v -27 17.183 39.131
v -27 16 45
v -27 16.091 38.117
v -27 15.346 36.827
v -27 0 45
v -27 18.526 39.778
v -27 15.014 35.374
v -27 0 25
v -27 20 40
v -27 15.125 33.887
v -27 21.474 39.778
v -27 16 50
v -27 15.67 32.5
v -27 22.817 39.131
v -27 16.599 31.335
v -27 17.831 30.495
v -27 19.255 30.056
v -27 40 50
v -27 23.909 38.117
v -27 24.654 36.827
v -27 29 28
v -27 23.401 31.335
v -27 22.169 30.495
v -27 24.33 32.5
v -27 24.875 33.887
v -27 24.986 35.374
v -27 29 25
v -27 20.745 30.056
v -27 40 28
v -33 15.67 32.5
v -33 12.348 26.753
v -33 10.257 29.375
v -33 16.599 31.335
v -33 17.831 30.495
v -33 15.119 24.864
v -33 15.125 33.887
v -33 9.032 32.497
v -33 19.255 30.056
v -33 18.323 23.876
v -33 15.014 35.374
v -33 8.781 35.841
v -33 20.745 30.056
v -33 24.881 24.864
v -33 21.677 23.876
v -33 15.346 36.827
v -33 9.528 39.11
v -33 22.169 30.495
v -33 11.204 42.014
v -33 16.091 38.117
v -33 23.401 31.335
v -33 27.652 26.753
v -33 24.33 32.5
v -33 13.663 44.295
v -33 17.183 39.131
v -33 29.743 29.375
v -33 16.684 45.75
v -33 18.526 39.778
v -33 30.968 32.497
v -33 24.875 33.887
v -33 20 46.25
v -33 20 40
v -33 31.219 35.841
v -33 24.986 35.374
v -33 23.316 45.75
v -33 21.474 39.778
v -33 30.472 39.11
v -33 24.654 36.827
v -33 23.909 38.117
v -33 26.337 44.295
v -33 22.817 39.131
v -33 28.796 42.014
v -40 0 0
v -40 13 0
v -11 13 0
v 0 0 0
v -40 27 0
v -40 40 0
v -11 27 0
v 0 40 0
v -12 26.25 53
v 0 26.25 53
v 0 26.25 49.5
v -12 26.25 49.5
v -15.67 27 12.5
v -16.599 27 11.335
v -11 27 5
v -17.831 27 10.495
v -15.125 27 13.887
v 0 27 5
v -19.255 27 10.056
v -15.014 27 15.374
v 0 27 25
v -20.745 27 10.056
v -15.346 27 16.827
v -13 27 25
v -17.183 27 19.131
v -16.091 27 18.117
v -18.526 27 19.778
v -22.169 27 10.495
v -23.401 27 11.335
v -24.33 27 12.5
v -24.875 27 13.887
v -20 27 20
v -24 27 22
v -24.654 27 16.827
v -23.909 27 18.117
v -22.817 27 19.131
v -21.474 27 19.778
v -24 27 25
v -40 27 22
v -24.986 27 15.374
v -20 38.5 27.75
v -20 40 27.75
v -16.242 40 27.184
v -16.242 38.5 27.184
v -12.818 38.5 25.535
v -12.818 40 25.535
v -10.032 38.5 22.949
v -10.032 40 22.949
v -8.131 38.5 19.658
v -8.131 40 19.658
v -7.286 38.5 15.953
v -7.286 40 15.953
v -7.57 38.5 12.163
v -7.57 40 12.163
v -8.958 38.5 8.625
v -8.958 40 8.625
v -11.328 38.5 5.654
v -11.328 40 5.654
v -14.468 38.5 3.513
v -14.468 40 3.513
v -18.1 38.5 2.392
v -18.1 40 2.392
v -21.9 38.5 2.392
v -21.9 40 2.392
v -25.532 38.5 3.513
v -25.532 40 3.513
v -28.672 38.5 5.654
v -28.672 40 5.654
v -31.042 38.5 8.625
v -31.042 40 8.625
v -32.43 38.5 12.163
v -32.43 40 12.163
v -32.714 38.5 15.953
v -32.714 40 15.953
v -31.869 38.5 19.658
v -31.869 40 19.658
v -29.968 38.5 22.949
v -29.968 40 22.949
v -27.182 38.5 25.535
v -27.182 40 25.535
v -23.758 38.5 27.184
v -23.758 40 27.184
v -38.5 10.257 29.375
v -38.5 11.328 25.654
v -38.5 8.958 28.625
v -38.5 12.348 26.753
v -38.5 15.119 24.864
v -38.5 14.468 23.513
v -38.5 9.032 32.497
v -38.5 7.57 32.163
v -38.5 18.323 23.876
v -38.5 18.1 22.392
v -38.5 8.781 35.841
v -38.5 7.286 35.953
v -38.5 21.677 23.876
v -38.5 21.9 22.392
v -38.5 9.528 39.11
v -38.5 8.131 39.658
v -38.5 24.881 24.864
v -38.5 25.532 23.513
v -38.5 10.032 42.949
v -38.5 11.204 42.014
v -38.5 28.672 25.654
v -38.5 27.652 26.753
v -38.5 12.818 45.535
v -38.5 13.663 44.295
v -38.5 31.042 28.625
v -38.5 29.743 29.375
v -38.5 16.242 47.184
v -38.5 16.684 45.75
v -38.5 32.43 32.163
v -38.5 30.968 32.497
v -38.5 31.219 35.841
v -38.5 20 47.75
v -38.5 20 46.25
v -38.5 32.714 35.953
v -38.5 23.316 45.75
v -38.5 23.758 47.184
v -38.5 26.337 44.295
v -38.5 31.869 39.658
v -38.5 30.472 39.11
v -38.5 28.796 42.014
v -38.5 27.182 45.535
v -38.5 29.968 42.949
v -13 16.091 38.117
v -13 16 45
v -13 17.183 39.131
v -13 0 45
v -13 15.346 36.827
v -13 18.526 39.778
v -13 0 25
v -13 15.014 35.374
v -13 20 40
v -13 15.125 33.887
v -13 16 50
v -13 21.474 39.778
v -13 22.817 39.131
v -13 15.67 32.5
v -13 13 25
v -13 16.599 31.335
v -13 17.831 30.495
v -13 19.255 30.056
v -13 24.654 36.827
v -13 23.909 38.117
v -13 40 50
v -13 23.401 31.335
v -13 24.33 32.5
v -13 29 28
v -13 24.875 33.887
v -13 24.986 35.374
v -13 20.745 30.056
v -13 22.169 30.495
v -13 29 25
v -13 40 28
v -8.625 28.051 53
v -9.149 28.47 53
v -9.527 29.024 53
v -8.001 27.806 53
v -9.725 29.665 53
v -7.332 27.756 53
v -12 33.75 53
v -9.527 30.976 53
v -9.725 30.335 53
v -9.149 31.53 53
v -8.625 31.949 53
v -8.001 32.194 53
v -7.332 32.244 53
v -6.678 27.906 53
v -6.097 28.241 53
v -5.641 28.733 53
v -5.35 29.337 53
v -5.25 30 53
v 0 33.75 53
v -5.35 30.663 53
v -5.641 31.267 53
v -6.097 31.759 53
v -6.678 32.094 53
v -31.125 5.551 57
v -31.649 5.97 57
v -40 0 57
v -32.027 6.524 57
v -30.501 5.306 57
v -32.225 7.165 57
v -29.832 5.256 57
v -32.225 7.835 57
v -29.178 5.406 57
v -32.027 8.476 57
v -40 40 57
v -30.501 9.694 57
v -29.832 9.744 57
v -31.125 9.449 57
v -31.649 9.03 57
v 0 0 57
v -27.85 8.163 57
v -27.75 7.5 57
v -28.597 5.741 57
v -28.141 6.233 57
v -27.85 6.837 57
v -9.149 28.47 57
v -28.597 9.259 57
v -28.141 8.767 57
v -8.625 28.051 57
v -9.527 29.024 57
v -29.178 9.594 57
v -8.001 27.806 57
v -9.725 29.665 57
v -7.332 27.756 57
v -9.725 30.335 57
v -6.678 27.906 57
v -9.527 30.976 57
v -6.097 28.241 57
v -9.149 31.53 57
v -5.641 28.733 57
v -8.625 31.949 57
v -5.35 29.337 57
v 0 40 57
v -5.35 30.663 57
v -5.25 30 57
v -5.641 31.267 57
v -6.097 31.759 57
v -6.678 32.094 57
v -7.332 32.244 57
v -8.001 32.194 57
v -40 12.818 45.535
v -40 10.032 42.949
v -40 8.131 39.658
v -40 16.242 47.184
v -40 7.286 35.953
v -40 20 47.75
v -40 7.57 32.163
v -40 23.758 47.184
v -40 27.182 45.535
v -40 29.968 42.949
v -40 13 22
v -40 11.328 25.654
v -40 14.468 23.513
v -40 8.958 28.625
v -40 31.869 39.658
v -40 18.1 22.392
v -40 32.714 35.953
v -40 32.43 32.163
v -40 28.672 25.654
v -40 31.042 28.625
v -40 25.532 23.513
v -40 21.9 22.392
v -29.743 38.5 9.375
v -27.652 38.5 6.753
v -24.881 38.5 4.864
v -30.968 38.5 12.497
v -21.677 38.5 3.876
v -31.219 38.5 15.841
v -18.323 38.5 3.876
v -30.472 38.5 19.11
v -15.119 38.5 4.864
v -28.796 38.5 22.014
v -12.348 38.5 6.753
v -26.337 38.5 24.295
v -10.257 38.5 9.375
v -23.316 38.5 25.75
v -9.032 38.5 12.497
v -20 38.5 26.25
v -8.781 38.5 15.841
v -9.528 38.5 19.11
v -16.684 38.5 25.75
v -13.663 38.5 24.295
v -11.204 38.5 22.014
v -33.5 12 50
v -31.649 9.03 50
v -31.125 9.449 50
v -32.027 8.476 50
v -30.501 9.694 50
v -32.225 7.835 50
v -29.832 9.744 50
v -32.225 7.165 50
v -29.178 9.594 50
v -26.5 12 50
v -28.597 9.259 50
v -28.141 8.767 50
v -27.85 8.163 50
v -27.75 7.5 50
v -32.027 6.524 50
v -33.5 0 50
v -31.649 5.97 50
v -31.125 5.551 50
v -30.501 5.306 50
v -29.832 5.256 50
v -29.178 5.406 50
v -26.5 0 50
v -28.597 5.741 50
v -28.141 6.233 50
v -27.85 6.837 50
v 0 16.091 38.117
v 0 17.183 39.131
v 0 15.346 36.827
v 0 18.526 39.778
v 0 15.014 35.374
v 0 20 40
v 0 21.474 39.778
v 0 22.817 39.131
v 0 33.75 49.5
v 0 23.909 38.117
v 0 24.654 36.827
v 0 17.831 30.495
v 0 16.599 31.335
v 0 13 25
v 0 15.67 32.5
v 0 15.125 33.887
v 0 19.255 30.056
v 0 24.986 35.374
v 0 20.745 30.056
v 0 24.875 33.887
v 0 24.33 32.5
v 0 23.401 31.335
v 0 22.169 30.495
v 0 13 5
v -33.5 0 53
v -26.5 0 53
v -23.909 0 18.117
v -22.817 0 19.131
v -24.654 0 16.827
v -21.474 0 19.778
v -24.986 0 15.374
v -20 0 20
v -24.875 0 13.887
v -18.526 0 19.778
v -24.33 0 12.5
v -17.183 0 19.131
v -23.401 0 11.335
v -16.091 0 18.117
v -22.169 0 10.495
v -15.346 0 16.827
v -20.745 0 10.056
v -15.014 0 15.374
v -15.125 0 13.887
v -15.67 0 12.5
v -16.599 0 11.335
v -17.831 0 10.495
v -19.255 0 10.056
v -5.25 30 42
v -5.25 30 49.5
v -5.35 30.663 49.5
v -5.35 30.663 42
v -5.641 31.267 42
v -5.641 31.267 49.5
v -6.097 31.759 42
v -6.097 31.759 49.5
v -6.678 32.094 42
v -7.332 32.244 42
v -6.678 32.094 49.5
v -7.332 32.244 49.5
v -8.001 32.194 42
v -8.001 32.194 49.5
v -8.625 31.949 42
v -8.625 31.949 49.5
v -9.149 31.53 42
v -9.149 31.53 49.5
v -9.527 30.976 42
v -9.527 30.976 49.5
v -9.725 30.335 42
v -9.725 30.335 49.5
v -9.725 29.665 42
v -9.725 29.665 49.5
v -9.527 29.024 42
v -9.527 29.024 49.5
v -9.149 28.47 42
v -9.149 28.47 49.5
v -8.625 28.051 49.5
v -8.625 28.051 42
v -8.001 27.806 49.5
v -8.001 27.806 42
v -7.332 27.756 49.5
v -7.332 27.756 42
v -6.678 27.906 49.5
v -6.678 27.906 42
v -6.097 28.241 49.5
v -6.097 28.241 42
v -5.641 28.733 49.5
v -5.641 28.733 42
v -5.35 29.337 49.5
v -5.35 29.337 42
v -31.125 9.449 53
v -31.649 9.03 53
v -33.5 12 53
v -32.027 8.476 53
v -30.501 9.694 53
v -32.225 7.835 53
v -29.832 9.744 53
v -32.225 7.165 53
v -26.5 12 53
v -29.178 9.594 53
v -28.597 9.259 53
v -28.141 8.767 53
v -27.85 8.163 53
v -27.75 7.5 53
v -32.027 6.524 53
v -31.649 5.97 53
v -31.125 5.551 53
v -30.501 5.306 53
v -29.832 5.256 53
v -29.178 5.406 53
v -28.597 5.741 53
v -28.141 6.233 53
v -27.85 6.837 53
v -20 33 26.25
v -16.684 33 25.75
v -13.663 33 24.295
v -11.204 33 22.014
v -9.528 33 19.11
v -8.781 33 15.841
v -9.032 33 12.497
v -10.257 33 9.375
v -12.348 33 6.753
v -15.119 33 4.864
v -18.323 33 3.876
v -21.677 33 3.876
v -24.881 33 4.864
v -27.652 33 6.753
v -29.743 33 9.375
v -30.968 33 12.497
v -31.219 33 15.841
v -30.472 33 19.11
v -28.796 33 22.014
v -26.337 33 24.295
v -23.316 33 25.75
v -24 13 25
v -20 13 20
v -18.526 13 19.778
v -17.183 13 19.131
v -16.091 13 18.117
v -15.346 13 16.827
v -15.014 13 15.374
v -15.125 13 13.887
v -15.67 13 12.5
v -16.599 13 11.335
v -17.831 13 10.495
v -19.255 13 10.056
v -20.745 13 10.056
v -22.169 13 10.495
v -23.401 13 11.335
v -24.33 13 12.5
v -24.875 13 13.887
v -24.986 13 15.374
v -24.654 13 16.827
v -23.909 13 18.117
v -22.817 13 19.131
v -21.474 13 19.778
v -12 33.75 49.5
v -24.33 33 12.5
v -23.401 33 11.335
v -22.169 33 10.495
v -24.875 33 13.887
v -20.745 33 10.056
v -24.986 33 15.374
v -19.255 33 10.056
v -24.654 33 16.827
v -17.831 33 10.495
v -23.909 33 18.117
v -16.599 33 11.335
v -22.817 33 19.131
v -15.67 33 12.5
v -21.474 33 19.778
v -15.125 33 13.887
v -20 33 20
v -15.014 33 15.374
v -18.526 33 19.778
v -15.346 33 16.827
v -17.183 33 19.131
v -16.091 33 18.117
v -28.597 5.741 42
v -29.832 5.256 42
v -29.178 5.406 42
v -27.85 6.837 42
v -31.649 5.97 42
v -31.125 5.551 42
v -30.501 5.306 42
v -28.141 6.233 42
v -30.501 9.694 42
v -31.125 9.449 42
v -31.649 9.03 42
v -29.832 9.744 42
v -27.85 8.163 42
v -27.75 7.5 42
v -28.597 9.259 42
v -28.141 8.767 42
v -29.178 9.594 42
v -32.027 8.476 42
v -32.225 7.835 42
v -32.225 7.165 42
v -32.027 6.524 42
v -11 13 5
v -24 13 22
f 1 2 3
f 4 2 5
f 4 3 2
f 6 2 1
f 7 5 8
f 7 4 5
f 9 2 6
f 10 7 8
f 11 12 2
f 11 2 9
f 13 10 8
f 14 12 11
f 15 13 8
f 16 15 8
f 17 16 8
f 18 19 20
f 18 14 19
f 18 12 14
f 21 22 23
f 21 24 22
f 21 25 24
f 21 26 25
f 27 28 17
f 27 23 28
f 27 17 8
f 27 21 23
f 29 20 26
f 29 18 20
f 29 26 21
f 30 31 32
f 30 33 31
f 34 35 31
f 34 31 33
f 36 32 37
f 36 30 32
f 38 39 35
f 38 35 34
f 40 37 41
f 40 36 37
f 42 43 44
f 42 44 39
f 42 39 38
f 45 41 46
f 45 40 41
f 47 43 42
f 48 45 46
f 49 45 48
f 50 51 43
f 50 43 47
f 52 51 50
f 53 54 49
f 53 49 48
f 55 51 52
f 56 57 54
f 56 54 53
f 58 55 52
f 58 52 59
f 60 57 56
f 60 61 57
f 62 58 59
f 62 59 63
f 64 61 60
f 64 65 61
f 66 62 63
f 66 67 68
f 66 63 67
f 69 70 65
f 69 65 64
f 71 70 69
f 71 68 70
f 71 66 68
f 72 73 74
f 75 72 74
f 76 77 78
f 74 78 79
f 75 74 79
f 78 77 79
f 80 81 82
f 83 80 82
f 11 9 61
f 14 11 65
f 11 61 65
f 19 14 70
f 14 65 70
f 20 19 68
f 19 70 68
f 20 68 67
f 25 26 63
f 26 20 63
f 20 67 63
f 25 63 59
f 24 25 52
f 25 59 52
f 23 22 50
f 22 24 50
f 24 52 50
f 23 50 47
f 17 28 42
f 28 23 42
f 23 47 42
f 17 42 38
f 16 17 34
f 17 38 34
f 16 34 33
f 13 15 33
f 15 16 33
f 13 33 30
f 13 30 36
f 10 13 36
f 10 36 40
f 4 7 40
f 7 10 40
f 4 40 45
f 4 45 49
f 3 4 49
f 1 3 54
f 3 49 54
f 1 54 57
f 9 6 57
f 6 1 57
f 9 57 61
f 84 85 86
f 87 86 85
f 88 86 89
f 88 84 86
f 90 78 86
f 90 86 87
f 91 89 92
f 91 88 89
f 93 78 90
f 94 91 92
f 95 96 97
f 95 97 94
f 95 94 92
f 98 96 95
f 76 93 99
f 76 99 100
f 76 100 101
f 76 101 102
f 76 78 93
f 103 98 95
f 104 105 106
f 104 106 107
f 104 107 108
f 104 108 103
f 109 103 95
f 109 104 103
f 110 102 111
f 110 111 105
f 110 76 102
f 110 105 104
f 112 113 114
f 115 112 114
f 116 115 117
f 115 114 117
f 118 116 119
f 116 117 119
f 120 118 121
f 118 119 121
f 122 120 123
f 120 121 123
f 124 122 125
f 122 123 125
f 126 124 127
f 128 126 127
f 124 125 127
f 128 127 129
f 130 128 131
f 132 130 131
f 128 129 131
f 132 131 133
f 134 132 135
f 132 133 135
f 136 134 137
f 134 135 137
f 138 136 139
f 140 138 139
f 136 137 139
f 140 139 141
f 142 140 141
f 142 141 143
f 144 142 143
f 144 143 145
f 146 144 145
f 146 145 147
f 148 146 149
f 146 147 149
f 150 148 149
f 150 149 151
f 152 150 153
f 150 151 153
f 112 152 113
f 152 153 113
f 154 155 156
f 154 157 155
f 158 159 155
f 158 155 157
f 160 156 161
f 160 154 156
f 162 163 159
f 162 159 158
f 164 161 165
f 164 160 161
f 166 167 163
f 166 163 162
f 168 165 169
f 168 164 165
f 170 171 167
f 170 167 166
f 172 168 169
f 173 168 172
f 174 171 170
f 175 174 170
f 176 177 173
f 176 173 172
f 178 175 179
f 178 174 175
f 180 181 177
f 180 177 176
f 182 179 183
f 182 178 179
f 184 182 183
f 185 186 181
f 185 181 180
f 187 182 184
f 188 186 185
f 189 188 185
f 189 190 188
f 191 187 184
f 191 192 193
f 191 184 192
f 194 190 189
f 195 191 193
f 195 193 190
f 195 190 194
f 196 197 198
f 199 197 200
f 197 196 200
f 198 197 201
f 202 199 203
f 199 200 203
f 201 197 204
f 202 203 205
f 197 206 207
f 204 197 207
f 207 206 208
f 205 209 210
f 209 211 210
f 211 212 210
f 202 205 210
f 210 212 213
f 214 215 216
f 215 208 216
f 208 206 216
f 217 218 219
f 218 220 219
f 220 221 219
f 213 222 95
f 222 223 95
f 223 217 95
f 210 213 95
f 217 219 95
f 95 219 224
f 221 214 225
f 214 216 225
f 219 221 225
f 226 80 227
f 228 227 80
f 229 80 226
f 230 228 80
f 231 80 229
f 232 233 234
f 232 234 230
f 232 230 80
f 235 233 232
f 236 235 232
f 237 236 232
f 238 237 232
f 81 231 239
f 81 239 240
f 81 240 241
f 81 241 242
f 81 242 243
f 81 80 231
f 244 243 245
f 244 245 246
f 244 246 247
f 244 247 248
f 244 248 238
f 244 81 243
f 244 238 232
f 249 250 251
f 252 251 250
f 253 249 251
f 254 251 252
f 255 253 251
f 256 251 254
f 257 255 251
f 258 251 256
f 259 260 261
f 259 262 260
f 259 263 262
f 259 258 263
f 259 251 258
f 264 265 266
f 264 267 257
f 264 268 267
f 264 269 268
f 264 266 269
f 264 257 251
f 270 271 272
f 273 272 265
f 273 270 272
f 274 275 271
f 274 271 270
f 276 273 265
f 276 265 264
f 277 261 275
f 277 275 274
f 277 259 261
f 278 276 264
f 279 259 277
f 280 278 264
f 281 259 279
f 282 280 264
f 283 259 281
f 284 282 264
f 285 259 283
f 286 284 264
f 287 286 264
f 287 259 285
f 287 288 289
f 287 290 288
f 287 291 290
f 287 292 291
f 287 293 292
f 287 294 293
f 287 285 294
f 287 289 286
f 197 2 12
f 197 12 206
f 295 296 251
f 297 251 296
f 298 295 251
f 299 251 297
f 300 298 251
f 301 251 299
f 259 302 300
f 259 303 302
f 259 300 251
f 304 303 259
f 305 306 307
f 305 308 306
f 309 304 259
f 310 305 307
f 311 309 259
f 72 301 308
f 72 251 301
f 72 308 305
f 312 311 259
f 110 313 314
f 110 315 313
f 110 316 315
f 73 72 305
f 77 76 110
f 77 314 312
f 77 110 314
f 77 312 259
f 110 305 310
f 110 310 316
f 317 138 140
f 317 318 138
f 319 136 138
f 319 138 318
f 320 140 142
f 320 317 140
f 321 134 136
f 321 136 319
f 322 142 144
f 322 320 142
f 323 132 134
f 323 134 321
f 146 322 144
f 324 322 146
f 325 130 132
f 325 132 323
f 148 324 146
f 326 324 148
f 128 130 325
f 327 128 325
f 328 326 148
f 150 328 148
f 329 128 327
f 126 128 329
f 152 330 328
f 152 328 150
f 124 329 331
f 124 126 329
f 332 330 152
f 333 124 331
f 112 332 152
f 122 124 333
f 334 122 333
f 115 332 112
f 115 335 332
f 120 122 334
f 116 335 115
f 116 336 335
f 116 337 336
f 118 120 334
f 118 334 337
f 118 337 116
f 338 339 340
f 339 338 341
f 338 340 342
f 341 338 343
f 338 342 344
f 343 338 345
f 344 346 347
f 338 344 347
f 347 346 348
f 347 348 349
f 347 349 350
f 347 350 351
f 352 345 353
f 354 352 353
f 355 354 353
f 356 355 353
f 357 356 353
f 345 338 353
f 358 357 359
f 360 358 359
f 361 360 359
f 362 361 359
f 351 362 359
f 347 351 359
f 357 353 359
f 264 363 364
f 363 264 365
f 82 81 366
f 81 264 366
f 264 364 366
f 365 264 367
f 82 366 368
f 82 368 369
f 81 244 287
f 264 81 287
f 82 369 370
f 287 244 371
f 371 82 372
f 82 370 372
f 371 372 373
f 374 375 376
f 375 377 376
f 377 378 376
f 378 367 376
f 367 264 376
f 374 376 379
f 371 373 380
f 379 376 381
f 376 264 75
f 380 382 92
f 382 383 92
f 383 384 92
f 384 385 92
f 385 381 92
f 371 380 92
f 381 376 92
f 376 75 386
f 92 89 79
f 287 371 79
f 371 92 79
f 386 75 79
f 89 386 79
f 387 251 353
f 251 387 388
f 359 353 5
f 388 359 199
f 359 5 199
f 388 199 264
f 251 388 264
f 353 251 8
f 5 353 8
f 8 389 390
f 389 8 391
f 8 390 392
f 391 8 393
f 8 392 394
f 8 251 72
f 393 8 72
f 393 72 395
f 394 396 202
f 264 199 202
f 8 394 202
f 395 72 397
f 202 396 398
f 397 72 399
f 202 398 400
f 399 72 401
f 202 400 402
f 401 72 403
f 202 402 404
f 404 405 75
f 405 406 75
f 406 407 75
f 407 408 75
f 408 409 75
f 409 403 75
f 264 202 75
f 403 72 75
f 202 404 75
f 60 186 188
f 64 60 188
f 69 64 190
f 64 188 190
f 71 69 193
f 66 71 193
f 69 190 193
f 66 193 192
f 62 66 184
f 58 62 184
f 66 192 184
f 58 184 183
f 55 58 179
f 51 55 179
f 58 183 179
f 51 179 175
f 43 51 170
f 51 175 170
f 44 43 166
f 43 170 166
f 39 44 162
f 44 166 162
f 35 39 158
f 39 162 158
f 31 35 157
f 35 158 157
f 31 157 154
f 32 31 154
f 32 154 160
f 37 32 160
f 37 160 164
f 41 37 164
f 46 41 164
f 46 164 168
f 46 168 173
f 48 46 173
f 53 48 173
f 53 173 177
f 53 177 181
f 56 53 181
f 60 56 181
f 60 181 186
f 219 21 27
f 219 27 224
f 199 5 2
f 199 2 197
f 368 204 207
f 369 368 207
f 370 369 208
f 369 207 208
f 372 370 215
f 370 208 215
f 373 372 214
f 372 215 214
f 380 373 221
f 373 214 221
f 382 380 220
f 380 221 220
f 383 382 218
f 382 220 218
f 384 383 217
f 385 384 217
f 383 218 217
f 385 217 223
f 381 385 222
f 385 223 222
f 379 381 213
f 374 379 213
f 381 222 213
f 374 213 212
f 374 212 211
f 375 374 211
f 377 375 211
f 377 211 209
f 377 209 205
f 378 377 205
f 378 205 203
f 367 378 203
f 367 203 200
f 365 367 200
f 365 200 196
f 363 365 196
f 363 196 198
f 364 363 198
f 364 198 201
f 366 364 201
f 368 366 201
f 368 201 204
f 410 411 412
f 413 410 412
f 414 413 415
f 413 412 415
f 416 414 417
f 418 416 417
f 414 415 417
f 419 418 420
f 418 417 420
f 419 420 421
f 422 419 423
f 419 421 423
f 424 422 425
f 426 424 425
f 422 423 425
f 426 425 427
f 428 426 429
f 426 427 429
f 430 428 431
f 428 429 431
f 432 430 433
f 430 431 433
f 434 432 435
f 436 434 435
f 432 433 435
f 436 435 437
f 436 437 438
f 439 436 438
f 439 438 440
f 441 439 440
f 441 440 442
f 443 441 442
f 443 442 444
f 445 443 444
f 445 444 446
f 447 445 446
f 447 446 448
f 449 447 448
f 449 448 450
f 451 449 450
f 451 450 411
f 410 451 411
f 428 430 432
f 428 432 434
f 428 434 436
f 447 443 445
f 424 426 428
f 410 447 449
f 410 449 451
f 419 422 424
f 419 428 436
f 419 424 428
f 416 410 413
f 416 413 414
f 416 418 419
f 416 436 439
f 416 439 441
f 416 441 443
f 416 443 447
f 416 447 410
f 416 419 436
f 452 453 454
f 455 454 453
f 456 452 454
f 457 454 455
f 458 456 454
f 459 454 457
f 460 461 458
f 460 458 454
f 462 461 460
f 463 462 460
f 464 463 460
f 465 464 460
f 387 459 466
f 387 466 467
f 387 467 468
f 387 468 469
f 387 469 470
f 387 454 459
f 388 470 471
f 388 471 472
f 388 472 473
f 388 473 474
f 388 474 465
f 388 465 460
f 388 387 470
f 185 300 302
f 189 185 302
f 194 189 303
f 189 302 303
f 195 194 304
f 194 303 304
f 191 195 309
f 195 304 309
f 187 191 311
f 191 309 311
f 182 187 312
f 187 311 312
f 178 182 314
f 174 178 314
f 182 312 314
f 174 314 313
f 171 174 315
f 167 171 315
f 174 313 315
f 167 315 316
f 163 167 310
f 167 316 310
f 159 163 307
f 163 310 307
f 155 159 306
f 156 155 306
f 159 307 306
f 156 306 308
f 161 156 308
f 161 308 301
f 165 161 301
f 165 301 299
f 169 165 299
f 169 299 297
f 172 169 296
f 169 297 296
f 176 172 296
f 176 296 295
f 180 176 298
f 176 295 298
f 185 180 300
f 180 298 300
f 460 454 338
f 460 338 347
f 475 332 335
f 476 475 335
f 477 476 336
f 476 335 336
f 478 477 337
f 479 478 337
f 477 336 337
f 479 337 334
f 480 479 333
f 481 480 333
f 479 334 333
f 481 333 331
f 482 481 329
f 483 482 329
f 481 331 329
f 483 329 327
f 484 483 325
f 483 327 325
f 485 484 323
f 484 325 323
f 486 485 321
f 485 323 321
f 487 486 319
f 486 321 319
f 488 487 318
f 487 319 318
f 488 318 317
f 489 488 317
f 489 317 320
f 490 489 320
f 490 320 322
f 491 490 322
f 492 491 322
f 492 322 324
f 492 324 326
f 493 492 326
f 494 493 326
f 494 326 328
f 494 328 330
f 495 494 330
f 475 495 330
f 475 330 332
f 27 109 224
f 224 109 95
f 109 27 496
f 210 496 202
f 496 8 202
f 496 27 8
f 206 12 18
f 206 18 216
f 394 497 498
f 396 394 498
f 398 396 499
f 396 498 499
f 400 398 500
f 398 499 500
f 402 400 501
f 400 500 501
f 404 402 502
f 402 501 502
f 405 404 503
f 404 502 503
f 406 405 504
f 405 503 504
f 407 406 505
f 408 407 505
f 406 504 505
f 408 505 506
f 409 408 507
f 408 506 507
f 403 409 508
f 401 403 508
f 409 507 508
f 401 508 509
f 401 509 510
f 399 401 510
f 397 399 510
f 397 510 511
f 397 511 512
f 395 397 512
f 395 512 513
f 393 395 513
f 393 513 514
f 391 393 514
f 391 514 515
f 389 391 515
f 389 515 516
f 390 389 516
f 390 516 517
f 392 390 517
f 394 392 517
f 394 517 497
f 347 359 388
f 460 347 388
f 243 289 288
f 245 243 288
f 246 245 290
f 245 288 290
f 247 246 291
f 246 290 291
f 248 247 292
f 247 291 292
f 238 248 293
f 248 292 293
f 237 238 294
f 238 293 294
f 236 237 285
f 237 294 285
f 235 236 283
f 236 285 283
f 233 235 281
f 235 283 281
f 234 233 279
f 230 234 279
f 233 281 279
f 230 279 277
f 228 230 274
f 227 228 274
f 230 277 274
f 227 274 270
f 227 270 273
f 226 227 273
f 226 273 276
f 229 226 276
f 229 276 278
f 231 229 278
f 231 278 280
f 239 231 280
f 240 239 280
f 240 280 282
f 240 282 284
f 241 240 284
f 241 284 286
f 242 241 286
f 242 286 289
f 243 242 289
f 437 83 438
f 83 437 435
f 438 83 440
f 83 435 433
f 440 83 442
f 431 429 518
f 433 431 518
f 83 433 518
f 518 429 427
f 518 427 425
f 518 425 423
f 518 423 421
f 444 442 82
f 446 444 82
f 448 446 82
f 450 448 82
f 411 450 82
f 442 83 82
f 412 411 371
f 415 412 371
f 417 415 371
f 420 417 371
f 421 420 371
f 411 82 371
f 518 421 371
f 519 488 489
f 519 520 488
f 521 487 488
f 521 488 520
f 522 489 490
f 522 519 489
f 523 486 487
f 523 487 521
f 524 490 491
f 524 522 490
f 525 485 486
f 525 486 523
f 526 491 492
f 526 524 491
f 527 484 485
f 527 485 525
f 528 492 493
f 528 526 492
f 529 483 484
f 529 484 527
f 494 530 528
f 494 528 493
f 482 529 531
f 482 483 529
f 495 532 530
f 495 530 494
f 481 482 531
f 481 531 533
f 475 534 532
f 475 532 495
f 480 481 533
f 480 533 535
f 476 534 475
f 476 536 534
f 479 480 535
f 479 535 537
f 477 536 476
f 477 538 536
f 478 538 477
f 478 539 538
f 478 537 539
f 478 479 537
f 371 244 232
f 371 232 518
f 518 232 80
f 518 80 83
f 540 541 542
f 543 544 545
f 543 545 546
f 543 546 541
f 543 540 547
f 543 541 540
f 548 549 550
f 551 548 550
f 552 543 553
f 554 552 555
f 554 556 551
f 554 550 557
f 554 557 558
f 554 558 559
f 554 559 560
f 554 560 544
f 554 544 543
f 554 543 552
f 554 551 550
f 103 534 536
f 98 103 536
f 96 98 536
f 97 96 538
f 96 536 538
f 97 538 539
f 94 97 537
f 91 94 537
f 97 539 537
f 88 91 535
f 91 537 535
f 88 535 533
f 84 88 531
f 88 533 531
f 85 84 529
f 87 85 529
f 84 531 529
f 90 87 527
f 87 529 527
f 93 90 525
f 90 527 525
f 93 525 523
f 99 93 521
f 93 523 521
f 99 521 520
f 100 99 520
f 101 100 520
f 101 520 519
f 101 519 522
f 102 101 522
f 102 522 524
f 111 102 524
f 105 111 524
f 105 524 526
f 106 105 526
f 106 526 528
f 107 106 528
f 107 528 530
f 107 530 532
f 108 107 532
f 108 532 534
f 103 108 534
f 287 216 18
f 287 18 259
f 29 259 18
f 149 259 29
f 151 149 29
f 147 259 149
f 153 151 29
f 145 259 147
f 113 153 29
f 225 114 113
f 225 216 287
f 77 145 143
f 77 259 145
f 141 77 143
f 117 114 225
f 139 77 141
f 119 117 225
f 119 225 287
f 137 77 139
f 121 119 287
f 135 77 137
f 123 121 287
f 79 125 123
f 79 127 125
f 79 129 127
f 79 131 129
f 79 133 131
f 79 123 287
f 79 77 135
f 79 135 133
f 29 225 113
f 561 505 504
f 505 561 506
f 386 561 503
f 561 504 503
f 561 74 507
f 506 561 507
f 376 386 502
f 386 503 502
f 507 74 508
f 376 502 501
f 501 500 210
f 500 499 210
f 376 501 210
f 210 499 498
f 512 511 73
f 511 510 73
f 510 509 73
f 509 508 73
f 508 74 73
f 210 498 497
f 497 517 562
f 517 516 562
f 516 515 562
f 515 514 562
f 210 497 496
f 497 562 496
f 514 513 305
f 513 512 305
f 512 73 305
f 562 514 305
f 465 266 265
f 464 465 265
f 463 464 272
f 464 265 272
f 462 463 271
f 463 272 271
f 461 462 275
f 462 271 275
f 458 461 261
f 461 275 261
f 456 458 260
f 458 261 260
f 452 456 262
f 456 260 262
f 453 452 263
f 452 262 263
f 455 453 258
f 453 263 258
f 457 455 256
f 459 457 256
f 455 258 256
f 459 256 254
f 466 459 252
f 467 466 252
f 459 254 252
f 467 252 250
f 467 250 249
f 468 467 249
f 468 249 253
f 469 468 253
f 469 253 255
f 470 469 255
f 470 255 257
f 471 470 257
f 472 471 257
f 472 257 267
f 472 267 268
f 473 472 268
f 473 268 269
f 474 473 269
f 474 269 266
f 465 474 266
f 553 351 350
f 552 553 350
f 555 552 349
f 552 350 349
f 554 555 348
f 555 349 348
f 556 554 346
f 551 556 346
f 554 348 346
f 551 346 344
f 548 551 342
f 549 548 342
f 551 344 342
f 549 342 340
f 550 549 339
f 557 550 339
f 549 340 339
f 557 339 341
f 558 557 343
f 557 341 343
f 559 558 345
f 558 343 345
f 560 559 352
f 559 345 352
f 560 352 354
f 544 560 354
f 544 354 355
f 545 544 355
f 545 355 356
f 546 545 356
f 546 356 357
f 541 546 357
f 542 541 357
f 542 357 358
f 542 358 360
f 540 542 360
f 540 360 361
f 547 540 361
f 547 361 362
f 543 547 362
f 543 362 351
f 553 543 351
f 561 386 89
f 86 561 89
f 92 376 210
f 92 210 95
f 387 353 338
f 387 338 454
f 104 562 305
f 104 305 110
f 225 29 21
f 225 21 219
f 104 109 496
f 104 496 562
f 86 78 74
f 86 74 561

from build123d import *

# Parameters (mm, degrees)
ESQUISSE1_W              = 40
ESQUISSE1_H              = 40
BOSS_EXTRU_1_DEPTH       = 50
ESQUISSE2_R              = 5
ENL_V_MAT_EXTRU_1_DEPTH  = 41
ESQUISSE3_R              = 5
ENL_V_MAT_EXTRU_2_DEPTH  = 41
ESQUISSE4_W              = 22
ESQUISSE4_H              = 14
ENL_V_MAT_EXTRU_3_DEPTH  = 29
ESQUISSE5_W              = 14
ESQUISSE5_H              = 20
ENL_V_MAT_EXTRU_4_DEPTH  = 29
ESQUISSE6_W              = 20
ESQUISSE6_H              = 14
ENL_V_MAT_EXTRU_5_DEPTH  = 24
ESQUISSE7_W              = 14
ESQUISSE7_H              = 22
ENL_V_MAT_EXTRU_6_DEPTH  = 24
ESQUISSE10_R             = 11.25
ENL_V_MAT_EXTRU_9_DEPTH  = 7
ESQUISSE11_R             = 12.75
ENL_V_MAT_EXTRU_10_DEPTH = 1.5
ESQUISSE14_R             = 11.25
ENL_V_MAT_EXTRU_11_DEPTH = 7
ESQUISSE15_R             = 12.75
ENL_V_MAT_EXTRU_12_DEPTH = 1.5
ESQUISSE16_W             = 40
ESQUISSE16_H             = 40
BOSS_EXTRU_2_DEPTH       = 7
ESQUISSE17_R             = 2.25
ENL_V_MAT_EXTRU_13_DEPTH = 15
ESQUISSE18_W             = 7
ESQUISSE18_H             = 3
ENL_V_MAT_EXTRU_14_DEPTH = 12
ESQUISSE19_W             = 3.5
ESQUISSE19_H             = 7.5
ENL_V_MAT_EXTRU_15_DEPTH = 12


with BuildPart() as part:
    # Esquisse1 → Boss.-Extru.1 (new body)
    with BuildSketch(Plane.XY):
        with Locations((-20, 20)):
            Rectangle(ESQUISSE1_W, ESQUISSE1_H)
    extrude(amount=BOSS_EXTRU_1_DEPTH)

    # Esquisse2 → Enlèv. mat.-Extru.1 (cut, through all)
    with BuildSketch(Plane(origin=(0, 40, 0), x_dir=(1, 0, 0), z_dir=(0, 1, 0))):
        with Locations(Location((-20, -15, 0), (0, 0, 270))):  # turned: the seam where the file's is
            Circle(ESQUISSE2_R)
    extrude(amount=-ENL_V_MAT_EXTRU_1_DEPTH, mode=Mode.SUBTRACT)

    # Esquisse3 → Enlèv. mat.-Extru.2 (cut, through all)
    with BuildSketch(Plane.ZY.offset(40)):
        with Locations((35, 20)):
            Circle(ESQUISSE3_R)
    extrude(amount=-ENL_V_MAT_EXTRU_2_DEPTH, mode=Mode.SUBTRACT)

    # Esquisse4 → Enlèv. mat.-Extru.3 (cut)
    with BuildSketch(Plane.ZY.offset(40)):
        with Locations((11, 20)):
            Rectangle(ESQUISSE4_W, ESQUISSE4_H)
    extrude(amount=-ENL_V_MAT_EXTRU_3_DEPTH, mode=Mode.SUBTRACT)

    # Esquisse5 → Enlèv. mat.-Extru.4 (cut)
    with BuildSketch(Plane.XZ):
        with Locations((-20, 35)):
            Rectangle(ESQUISSE5_W, ESQUISSE5_H)
    extrude(amount=-ENL_V_MAT_EXTRU_4_DEPTH, mode=Mode.SUBTRACT)

    # Esquisse6 → Enlèv. mat.-Extru.5 (cut)
    with BuildSketch(Plane(origin=(0, 0, 0), x_dir=(0, 0, -1), z_dir=(1, 0, 0))):
        with Locations((-15, 20)):
            Rectangle(ESQUISSE6_W, ESQUISSE6_H)
    extrude(amount=-ENL_V_MAT_EXTRU_5_DEPTH, mode=Mode.SUBTRACT)

    # Esquisse7 → Enlèv. mat.-Extru.6 (cut)
    with BuildSketch(Plane(origin=(0, 40, 0), x_dir=(1, 0, 0), z_dir=(0, 1, 0))):
        with Locations((-20, -39)):
            Rectangle(ESQUISSE7_W, ESQUISSE7_H)
    extrude(amount=-ENL_V_MAT_EXTRU_6_DEPTH, mode=Mode.SUBTRACT)

    # Esquisse10 → Enlèv. mat.-Extru.9 (cut)
    with BuildSketch(Plane(origin=(0, 40, 0), x_dir=(1, 0, 0), z_dir=(0, 1, 0))):
        with Locations(Location((-20, -15, 0), (0, 0, 270))):  # turned: the seam where the file's is
            Circle(ESQUISSE10_R)
    extrude(amount=-ENL_V_MAT_EXTRU_9_DEPTH, mode=Mode.SUBTRACT)

    # Esquisse11 → Enlèv. mat.-Extru.10 (cut)
    with BuildSketch(Plane(origin=(0, 40, 0), x_dir=(1, 0, 0), z_dir=(0, 1, 0))):
        with Locations(Location((-20, -15, 0), (0, 0, 270))):  # turned: the seam where the file's is
            Circle(ESQUISSE11_R)
    extrude(amount=-ENL_V_MAT_EXTRU_10_DEPTH, mode=Mode.SUBTRACT)

    # Esquisse14 → Enlèv. mat.-Extru.11 (cut)
    with BuildSketch(Plane.ZY.offset(40)):
        with Locations((35, 20)):
            Circle(ESQUISSE14_R)
    extrude(amount=-ENL_V_MAT_EXTRU_11_DEPTH, mode=Mode.SUBTRACT)

    # Esquisse15 → Enlèv. mat.-Extru.12 (cut)
    with BuildSketch(Plane.ZY.offset(40)):
        with Locations((35, 20)):
            Circle(ESQUISSE15_R)
    extrude(amount=-ENL_V_MAT_EXTRU_12_DEPTH, mode=Mode.SUBTRACT)

    # Esquisse16 → Boss.-Extru.2 (add)
    with BuildSketch(Plane.XY.offset(50)):
        with Locations((-20, 20)):
            Rectangle(ESQUISSE16_W, ESQUISSE16_H)
    extrude(amount=BOSS_EXTRU_2_DEPTH)

    # Esquisse17 → Enlèv. mat.-Extru.13 (cut)
    with BuildSketch(Plane.XY.offset(57)):
        with Locations((-30, 7.5)):
            Circle(ESQUISSE17_R)
        with Locations((-7.5, 30)):
            Circle(ESQUISSE17_R)
    extrude(amount=-ENL_V_MAT_EXTRU_13_DEPTH, mode=Mode.SUBTRACT)

    # Esquisse18 → Enlèv. mat.-Extru.14 (cut)
    with BuildSketch(Plane.XZ):
        with Locations((-30, 51.5)):
            Rectangle(ESQUISSE18_W, ESQUISSE18_H)
    extrude(amount=-ENL_V_MAT_EXTRU_14_DEPTH, mode=Mode.SUBTRACT)

    # Esquisse19 → Enlèv. mat.-Extru.15 (cut)
    with BuildSketch(Plane(origin=(0, 0, 0), x_dir=(0, 0, -1), z_dir=(1, 0, 0))):
        with Locations((-51.25, 30)):
            Rectangle(ESQUISSE19_W, ESQUISSE19_H)
    extrude(amount=-ENL_V_MAT_EXTRU_15_DEPTH, mode=Mode.SUBTRACT)


solid = part.part
